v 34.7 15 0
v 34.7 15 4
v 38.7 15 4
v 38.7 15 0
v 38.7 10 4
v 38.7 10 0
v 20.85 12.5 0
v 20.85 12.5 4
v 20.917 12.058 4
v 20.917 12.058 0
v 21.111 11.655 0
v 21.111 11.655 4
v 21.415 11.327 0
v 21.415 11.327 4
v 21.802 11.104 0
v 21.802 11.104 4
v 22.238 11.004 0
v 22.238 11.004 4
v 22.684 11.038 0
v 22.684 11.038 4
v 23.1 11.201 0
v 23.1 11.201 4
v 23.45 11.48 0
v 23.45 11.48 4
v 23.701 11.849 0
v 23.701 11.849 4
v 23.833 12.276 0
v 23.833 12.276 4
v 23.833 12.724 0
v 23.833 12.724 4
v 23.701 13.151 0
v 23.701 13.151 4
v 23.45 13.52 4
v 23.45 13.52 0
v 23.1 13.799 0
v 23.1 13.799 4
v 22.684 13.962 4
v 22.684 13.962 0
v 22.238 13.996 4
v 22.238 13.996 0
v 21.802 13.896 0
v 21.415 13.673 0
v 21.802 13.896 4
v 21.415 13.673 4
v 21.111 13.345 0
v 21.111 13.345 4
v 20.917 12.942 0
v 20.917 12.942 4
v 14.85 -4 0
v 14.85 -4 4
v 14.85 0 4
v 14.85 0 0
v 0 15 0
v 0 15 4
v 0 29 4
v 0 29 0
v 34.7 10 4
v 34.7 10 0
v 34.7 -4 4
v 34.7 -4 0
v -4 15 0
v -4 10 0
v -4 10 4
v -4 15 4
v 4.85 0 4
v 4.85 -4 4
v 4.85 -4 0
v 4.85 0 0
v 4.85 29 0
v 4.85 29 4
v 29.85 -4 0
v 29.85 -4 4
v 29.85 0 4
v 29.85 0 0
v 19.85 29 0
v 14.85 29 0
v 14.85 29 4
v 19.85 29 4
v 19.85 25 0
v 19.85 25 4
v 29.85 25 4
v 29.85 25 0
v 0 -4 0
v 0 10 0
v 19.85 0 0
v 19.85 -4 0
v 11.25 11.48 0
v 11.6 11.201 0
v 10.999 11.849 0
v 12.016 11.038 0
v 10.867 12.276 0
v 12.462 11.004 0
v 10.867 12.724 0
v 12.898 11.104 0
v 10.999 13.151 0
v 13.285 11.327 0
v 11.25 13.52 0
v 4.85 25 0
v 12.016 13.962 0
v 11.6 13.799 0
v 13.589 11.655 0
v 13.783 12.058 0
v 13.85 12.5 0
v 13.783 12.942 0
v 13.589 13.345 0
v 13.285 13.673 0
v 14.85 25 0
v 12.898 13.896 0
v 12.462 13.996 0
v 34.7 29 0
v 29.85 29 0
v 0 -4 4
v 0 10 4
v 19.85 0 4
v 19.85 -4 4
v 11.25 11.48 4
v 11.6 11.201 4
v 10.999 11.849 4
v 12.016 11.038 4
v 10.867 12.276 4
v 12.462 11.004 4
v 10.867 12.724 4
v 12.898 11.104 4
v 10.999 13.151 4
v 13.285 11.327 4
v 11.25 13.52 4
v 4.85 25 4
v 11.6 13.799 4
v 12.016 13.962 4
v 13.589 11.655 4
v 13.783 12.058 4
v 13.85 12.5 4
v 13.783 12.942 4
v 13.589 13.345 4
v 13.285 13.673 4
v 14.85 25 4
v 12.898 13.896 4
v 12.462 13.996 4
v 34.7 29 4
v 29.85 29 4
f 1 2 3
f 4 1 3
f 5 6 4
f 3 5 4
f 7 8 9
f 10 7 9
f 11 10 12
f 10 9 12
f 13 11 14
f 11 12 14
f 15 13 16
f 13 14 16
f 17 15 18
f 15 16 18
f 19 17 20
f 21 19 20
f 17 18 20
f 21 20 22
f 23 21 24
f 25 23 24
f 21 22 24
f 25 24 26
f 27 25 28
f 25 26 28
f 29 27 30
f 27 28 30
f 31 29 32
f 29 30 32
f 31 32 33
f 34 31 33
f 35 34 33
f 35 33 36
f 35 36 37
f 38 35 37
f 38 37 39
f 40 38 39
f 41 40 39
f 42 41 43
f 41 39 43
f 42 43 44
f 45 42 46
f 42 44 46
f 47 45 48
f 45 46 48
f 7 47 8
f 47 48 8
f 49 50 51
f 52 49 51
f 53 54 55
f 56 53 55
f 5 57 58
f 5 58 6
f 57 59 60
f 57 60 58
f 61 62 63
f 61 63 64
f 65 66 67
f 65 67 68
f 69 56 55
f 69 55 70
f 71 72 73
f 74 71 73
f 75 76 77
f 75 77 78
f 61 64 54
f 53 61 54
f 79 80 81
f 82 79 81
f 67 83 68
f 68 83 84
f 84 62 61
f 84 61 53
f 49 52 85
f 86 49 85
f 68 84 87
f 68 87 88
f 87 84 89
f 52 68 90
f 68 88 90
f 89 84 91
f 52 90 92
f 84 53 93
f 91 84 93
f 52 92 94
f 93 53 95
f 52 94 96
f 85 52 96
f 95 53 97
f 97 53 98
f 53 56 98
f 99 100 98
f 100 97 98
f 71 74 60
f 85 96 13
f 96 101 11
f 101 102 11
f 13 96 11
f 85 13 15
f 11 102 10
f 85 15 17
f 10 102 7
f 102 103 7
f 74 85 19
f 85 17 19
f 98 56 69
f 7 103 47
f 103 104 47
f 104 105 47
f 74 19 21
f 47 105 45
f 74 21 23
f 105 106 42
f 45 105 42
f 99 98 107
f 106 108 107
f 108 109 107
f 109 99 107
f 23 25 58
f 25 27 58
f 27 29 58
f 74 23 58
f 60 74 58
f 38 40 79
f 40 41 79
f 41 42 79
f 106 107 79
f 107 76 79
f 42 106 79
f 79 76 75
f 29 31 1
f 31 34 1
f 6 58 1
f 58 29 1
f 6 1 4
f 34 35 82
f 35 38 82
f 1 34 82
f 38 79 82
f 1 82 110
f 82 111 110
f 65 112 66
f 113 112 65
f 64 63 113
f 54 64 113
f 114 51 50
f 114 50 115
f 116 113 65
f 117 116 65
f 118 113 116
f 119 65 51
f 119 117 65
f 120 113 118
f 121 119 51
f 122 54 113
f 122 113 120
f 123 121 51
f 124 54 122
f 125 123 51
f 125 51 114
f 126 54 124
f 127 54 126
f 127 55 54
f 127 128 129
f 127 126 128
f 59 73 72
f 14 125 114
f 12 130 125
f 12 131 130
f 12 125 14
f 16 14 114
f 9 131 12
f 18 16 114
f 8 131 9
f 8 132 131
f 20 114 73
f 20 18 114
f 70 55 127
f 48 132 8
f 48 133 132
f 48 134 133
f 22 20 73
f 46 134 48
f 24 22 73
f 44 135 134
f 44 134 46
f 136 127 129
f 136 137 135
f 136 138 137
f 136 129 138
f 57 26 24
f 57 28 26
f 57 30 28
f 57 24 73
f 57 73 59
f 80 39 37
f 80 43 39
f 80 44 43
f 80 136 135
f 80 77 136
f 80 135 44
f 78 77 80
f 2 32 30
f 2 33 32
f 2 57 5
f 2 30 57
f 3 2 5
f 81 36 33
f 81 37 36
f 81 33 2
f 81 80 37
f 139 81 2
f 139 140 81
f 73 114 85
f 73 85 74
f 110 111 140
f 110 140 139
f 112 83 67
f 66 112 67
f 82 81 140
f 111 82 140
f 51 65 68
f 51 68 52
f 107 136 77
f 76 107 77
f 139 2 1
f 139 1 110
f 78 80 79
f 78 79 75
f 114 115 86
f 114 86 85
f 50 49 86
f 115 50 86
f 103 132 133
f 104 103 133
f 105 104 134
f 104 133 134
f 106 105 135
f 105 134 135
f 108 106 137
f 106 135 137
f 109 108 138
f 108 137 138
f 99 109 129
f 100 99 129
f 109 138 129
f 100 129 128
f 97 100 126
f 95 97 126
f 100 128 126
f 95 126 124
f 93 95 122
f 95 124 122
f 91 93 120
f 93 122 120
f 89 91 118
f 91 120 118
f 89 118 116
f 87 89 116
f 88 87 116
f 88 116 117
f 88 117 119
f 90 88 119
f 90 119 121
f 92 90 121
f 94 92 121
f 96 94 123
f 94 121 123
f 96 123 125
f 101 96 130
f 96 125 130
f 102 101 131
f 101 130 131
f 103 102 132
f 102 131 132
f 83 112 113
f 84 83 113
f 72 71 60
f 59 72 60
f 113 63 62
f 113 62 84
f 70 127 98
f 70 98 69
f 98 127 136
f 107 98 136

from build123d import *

# Parameters (mm, degrees)
SKETCH_1_W          = 42.7
SKETCH_1_H          = 33
EXTRUDE_1_DEPTH     = 4
SKETCH_2_R          = 1.5
SKETCH_2_W          = 10
SKETCH_2_H          = 4
SKETCH_2_W_2        = 4
SKETCH_2_H_2        = 14
CUT_EXTRUDE_2_DEPTH = 4


with BuildPart() as part:
    # Эскиз1 → Бобышка-Вытянуть1 (new body)
    with BuildSketch(Plane.XY):
        with Locations((17.35, 12.5)):
            Rectangle(SKETCH_1_W, SKETCH_1_H)
    extrude(amount=EXTRUDE_1_DEPTH)

    # Эскиз2 → Вырез-Вытянуть2 (cut)
    with BuildSketch(Plane.XY.offset(4)):
        with Locations((12.35, 12.5)):
            Circle(SKETCH_2_R)
        with Locations(Location((22.35, 12.5, 0), (0, 0, 180))):
            Circle(SKETCH_2_R)
        with Locations((9.85, 27)):
            Rectangle(SKETCH_2_W, SKETCH_2_H)
        with Locations((24.85, 27)):
            Rectangle(SKETCH_2_W, SKETCH_2_H)
        with Locations((-2, 3)):
            Rectangle(SKETCH_2_W_2, SKETCH_2_H_2)
        with Locations((-2, 22)):
            Rectangle(SKETCH_2_W_2, SKETCH_2_H_2)
        with Locations((24.85, -2)):
            Rectangle(SKETCH_2_W, SKETCH_2_H)
        with Locations((9.85, -2)):
            Rectangle(SKETCH_2_W, SKETCH_2_H)
        with Locations((36.7, 3)):
            Rectangle(SKETCH_2_W_2, SKETCH_2_H_2)
        with Locations((36.7, 22)):
            Rectangle(SKETCH_2_W_2, SKETCH_2_H_2)
    extrude(amount=-CUT_EXTRUDE_2_DEPTH, mode=Mode.SUBTRACT)


solid = part.part
